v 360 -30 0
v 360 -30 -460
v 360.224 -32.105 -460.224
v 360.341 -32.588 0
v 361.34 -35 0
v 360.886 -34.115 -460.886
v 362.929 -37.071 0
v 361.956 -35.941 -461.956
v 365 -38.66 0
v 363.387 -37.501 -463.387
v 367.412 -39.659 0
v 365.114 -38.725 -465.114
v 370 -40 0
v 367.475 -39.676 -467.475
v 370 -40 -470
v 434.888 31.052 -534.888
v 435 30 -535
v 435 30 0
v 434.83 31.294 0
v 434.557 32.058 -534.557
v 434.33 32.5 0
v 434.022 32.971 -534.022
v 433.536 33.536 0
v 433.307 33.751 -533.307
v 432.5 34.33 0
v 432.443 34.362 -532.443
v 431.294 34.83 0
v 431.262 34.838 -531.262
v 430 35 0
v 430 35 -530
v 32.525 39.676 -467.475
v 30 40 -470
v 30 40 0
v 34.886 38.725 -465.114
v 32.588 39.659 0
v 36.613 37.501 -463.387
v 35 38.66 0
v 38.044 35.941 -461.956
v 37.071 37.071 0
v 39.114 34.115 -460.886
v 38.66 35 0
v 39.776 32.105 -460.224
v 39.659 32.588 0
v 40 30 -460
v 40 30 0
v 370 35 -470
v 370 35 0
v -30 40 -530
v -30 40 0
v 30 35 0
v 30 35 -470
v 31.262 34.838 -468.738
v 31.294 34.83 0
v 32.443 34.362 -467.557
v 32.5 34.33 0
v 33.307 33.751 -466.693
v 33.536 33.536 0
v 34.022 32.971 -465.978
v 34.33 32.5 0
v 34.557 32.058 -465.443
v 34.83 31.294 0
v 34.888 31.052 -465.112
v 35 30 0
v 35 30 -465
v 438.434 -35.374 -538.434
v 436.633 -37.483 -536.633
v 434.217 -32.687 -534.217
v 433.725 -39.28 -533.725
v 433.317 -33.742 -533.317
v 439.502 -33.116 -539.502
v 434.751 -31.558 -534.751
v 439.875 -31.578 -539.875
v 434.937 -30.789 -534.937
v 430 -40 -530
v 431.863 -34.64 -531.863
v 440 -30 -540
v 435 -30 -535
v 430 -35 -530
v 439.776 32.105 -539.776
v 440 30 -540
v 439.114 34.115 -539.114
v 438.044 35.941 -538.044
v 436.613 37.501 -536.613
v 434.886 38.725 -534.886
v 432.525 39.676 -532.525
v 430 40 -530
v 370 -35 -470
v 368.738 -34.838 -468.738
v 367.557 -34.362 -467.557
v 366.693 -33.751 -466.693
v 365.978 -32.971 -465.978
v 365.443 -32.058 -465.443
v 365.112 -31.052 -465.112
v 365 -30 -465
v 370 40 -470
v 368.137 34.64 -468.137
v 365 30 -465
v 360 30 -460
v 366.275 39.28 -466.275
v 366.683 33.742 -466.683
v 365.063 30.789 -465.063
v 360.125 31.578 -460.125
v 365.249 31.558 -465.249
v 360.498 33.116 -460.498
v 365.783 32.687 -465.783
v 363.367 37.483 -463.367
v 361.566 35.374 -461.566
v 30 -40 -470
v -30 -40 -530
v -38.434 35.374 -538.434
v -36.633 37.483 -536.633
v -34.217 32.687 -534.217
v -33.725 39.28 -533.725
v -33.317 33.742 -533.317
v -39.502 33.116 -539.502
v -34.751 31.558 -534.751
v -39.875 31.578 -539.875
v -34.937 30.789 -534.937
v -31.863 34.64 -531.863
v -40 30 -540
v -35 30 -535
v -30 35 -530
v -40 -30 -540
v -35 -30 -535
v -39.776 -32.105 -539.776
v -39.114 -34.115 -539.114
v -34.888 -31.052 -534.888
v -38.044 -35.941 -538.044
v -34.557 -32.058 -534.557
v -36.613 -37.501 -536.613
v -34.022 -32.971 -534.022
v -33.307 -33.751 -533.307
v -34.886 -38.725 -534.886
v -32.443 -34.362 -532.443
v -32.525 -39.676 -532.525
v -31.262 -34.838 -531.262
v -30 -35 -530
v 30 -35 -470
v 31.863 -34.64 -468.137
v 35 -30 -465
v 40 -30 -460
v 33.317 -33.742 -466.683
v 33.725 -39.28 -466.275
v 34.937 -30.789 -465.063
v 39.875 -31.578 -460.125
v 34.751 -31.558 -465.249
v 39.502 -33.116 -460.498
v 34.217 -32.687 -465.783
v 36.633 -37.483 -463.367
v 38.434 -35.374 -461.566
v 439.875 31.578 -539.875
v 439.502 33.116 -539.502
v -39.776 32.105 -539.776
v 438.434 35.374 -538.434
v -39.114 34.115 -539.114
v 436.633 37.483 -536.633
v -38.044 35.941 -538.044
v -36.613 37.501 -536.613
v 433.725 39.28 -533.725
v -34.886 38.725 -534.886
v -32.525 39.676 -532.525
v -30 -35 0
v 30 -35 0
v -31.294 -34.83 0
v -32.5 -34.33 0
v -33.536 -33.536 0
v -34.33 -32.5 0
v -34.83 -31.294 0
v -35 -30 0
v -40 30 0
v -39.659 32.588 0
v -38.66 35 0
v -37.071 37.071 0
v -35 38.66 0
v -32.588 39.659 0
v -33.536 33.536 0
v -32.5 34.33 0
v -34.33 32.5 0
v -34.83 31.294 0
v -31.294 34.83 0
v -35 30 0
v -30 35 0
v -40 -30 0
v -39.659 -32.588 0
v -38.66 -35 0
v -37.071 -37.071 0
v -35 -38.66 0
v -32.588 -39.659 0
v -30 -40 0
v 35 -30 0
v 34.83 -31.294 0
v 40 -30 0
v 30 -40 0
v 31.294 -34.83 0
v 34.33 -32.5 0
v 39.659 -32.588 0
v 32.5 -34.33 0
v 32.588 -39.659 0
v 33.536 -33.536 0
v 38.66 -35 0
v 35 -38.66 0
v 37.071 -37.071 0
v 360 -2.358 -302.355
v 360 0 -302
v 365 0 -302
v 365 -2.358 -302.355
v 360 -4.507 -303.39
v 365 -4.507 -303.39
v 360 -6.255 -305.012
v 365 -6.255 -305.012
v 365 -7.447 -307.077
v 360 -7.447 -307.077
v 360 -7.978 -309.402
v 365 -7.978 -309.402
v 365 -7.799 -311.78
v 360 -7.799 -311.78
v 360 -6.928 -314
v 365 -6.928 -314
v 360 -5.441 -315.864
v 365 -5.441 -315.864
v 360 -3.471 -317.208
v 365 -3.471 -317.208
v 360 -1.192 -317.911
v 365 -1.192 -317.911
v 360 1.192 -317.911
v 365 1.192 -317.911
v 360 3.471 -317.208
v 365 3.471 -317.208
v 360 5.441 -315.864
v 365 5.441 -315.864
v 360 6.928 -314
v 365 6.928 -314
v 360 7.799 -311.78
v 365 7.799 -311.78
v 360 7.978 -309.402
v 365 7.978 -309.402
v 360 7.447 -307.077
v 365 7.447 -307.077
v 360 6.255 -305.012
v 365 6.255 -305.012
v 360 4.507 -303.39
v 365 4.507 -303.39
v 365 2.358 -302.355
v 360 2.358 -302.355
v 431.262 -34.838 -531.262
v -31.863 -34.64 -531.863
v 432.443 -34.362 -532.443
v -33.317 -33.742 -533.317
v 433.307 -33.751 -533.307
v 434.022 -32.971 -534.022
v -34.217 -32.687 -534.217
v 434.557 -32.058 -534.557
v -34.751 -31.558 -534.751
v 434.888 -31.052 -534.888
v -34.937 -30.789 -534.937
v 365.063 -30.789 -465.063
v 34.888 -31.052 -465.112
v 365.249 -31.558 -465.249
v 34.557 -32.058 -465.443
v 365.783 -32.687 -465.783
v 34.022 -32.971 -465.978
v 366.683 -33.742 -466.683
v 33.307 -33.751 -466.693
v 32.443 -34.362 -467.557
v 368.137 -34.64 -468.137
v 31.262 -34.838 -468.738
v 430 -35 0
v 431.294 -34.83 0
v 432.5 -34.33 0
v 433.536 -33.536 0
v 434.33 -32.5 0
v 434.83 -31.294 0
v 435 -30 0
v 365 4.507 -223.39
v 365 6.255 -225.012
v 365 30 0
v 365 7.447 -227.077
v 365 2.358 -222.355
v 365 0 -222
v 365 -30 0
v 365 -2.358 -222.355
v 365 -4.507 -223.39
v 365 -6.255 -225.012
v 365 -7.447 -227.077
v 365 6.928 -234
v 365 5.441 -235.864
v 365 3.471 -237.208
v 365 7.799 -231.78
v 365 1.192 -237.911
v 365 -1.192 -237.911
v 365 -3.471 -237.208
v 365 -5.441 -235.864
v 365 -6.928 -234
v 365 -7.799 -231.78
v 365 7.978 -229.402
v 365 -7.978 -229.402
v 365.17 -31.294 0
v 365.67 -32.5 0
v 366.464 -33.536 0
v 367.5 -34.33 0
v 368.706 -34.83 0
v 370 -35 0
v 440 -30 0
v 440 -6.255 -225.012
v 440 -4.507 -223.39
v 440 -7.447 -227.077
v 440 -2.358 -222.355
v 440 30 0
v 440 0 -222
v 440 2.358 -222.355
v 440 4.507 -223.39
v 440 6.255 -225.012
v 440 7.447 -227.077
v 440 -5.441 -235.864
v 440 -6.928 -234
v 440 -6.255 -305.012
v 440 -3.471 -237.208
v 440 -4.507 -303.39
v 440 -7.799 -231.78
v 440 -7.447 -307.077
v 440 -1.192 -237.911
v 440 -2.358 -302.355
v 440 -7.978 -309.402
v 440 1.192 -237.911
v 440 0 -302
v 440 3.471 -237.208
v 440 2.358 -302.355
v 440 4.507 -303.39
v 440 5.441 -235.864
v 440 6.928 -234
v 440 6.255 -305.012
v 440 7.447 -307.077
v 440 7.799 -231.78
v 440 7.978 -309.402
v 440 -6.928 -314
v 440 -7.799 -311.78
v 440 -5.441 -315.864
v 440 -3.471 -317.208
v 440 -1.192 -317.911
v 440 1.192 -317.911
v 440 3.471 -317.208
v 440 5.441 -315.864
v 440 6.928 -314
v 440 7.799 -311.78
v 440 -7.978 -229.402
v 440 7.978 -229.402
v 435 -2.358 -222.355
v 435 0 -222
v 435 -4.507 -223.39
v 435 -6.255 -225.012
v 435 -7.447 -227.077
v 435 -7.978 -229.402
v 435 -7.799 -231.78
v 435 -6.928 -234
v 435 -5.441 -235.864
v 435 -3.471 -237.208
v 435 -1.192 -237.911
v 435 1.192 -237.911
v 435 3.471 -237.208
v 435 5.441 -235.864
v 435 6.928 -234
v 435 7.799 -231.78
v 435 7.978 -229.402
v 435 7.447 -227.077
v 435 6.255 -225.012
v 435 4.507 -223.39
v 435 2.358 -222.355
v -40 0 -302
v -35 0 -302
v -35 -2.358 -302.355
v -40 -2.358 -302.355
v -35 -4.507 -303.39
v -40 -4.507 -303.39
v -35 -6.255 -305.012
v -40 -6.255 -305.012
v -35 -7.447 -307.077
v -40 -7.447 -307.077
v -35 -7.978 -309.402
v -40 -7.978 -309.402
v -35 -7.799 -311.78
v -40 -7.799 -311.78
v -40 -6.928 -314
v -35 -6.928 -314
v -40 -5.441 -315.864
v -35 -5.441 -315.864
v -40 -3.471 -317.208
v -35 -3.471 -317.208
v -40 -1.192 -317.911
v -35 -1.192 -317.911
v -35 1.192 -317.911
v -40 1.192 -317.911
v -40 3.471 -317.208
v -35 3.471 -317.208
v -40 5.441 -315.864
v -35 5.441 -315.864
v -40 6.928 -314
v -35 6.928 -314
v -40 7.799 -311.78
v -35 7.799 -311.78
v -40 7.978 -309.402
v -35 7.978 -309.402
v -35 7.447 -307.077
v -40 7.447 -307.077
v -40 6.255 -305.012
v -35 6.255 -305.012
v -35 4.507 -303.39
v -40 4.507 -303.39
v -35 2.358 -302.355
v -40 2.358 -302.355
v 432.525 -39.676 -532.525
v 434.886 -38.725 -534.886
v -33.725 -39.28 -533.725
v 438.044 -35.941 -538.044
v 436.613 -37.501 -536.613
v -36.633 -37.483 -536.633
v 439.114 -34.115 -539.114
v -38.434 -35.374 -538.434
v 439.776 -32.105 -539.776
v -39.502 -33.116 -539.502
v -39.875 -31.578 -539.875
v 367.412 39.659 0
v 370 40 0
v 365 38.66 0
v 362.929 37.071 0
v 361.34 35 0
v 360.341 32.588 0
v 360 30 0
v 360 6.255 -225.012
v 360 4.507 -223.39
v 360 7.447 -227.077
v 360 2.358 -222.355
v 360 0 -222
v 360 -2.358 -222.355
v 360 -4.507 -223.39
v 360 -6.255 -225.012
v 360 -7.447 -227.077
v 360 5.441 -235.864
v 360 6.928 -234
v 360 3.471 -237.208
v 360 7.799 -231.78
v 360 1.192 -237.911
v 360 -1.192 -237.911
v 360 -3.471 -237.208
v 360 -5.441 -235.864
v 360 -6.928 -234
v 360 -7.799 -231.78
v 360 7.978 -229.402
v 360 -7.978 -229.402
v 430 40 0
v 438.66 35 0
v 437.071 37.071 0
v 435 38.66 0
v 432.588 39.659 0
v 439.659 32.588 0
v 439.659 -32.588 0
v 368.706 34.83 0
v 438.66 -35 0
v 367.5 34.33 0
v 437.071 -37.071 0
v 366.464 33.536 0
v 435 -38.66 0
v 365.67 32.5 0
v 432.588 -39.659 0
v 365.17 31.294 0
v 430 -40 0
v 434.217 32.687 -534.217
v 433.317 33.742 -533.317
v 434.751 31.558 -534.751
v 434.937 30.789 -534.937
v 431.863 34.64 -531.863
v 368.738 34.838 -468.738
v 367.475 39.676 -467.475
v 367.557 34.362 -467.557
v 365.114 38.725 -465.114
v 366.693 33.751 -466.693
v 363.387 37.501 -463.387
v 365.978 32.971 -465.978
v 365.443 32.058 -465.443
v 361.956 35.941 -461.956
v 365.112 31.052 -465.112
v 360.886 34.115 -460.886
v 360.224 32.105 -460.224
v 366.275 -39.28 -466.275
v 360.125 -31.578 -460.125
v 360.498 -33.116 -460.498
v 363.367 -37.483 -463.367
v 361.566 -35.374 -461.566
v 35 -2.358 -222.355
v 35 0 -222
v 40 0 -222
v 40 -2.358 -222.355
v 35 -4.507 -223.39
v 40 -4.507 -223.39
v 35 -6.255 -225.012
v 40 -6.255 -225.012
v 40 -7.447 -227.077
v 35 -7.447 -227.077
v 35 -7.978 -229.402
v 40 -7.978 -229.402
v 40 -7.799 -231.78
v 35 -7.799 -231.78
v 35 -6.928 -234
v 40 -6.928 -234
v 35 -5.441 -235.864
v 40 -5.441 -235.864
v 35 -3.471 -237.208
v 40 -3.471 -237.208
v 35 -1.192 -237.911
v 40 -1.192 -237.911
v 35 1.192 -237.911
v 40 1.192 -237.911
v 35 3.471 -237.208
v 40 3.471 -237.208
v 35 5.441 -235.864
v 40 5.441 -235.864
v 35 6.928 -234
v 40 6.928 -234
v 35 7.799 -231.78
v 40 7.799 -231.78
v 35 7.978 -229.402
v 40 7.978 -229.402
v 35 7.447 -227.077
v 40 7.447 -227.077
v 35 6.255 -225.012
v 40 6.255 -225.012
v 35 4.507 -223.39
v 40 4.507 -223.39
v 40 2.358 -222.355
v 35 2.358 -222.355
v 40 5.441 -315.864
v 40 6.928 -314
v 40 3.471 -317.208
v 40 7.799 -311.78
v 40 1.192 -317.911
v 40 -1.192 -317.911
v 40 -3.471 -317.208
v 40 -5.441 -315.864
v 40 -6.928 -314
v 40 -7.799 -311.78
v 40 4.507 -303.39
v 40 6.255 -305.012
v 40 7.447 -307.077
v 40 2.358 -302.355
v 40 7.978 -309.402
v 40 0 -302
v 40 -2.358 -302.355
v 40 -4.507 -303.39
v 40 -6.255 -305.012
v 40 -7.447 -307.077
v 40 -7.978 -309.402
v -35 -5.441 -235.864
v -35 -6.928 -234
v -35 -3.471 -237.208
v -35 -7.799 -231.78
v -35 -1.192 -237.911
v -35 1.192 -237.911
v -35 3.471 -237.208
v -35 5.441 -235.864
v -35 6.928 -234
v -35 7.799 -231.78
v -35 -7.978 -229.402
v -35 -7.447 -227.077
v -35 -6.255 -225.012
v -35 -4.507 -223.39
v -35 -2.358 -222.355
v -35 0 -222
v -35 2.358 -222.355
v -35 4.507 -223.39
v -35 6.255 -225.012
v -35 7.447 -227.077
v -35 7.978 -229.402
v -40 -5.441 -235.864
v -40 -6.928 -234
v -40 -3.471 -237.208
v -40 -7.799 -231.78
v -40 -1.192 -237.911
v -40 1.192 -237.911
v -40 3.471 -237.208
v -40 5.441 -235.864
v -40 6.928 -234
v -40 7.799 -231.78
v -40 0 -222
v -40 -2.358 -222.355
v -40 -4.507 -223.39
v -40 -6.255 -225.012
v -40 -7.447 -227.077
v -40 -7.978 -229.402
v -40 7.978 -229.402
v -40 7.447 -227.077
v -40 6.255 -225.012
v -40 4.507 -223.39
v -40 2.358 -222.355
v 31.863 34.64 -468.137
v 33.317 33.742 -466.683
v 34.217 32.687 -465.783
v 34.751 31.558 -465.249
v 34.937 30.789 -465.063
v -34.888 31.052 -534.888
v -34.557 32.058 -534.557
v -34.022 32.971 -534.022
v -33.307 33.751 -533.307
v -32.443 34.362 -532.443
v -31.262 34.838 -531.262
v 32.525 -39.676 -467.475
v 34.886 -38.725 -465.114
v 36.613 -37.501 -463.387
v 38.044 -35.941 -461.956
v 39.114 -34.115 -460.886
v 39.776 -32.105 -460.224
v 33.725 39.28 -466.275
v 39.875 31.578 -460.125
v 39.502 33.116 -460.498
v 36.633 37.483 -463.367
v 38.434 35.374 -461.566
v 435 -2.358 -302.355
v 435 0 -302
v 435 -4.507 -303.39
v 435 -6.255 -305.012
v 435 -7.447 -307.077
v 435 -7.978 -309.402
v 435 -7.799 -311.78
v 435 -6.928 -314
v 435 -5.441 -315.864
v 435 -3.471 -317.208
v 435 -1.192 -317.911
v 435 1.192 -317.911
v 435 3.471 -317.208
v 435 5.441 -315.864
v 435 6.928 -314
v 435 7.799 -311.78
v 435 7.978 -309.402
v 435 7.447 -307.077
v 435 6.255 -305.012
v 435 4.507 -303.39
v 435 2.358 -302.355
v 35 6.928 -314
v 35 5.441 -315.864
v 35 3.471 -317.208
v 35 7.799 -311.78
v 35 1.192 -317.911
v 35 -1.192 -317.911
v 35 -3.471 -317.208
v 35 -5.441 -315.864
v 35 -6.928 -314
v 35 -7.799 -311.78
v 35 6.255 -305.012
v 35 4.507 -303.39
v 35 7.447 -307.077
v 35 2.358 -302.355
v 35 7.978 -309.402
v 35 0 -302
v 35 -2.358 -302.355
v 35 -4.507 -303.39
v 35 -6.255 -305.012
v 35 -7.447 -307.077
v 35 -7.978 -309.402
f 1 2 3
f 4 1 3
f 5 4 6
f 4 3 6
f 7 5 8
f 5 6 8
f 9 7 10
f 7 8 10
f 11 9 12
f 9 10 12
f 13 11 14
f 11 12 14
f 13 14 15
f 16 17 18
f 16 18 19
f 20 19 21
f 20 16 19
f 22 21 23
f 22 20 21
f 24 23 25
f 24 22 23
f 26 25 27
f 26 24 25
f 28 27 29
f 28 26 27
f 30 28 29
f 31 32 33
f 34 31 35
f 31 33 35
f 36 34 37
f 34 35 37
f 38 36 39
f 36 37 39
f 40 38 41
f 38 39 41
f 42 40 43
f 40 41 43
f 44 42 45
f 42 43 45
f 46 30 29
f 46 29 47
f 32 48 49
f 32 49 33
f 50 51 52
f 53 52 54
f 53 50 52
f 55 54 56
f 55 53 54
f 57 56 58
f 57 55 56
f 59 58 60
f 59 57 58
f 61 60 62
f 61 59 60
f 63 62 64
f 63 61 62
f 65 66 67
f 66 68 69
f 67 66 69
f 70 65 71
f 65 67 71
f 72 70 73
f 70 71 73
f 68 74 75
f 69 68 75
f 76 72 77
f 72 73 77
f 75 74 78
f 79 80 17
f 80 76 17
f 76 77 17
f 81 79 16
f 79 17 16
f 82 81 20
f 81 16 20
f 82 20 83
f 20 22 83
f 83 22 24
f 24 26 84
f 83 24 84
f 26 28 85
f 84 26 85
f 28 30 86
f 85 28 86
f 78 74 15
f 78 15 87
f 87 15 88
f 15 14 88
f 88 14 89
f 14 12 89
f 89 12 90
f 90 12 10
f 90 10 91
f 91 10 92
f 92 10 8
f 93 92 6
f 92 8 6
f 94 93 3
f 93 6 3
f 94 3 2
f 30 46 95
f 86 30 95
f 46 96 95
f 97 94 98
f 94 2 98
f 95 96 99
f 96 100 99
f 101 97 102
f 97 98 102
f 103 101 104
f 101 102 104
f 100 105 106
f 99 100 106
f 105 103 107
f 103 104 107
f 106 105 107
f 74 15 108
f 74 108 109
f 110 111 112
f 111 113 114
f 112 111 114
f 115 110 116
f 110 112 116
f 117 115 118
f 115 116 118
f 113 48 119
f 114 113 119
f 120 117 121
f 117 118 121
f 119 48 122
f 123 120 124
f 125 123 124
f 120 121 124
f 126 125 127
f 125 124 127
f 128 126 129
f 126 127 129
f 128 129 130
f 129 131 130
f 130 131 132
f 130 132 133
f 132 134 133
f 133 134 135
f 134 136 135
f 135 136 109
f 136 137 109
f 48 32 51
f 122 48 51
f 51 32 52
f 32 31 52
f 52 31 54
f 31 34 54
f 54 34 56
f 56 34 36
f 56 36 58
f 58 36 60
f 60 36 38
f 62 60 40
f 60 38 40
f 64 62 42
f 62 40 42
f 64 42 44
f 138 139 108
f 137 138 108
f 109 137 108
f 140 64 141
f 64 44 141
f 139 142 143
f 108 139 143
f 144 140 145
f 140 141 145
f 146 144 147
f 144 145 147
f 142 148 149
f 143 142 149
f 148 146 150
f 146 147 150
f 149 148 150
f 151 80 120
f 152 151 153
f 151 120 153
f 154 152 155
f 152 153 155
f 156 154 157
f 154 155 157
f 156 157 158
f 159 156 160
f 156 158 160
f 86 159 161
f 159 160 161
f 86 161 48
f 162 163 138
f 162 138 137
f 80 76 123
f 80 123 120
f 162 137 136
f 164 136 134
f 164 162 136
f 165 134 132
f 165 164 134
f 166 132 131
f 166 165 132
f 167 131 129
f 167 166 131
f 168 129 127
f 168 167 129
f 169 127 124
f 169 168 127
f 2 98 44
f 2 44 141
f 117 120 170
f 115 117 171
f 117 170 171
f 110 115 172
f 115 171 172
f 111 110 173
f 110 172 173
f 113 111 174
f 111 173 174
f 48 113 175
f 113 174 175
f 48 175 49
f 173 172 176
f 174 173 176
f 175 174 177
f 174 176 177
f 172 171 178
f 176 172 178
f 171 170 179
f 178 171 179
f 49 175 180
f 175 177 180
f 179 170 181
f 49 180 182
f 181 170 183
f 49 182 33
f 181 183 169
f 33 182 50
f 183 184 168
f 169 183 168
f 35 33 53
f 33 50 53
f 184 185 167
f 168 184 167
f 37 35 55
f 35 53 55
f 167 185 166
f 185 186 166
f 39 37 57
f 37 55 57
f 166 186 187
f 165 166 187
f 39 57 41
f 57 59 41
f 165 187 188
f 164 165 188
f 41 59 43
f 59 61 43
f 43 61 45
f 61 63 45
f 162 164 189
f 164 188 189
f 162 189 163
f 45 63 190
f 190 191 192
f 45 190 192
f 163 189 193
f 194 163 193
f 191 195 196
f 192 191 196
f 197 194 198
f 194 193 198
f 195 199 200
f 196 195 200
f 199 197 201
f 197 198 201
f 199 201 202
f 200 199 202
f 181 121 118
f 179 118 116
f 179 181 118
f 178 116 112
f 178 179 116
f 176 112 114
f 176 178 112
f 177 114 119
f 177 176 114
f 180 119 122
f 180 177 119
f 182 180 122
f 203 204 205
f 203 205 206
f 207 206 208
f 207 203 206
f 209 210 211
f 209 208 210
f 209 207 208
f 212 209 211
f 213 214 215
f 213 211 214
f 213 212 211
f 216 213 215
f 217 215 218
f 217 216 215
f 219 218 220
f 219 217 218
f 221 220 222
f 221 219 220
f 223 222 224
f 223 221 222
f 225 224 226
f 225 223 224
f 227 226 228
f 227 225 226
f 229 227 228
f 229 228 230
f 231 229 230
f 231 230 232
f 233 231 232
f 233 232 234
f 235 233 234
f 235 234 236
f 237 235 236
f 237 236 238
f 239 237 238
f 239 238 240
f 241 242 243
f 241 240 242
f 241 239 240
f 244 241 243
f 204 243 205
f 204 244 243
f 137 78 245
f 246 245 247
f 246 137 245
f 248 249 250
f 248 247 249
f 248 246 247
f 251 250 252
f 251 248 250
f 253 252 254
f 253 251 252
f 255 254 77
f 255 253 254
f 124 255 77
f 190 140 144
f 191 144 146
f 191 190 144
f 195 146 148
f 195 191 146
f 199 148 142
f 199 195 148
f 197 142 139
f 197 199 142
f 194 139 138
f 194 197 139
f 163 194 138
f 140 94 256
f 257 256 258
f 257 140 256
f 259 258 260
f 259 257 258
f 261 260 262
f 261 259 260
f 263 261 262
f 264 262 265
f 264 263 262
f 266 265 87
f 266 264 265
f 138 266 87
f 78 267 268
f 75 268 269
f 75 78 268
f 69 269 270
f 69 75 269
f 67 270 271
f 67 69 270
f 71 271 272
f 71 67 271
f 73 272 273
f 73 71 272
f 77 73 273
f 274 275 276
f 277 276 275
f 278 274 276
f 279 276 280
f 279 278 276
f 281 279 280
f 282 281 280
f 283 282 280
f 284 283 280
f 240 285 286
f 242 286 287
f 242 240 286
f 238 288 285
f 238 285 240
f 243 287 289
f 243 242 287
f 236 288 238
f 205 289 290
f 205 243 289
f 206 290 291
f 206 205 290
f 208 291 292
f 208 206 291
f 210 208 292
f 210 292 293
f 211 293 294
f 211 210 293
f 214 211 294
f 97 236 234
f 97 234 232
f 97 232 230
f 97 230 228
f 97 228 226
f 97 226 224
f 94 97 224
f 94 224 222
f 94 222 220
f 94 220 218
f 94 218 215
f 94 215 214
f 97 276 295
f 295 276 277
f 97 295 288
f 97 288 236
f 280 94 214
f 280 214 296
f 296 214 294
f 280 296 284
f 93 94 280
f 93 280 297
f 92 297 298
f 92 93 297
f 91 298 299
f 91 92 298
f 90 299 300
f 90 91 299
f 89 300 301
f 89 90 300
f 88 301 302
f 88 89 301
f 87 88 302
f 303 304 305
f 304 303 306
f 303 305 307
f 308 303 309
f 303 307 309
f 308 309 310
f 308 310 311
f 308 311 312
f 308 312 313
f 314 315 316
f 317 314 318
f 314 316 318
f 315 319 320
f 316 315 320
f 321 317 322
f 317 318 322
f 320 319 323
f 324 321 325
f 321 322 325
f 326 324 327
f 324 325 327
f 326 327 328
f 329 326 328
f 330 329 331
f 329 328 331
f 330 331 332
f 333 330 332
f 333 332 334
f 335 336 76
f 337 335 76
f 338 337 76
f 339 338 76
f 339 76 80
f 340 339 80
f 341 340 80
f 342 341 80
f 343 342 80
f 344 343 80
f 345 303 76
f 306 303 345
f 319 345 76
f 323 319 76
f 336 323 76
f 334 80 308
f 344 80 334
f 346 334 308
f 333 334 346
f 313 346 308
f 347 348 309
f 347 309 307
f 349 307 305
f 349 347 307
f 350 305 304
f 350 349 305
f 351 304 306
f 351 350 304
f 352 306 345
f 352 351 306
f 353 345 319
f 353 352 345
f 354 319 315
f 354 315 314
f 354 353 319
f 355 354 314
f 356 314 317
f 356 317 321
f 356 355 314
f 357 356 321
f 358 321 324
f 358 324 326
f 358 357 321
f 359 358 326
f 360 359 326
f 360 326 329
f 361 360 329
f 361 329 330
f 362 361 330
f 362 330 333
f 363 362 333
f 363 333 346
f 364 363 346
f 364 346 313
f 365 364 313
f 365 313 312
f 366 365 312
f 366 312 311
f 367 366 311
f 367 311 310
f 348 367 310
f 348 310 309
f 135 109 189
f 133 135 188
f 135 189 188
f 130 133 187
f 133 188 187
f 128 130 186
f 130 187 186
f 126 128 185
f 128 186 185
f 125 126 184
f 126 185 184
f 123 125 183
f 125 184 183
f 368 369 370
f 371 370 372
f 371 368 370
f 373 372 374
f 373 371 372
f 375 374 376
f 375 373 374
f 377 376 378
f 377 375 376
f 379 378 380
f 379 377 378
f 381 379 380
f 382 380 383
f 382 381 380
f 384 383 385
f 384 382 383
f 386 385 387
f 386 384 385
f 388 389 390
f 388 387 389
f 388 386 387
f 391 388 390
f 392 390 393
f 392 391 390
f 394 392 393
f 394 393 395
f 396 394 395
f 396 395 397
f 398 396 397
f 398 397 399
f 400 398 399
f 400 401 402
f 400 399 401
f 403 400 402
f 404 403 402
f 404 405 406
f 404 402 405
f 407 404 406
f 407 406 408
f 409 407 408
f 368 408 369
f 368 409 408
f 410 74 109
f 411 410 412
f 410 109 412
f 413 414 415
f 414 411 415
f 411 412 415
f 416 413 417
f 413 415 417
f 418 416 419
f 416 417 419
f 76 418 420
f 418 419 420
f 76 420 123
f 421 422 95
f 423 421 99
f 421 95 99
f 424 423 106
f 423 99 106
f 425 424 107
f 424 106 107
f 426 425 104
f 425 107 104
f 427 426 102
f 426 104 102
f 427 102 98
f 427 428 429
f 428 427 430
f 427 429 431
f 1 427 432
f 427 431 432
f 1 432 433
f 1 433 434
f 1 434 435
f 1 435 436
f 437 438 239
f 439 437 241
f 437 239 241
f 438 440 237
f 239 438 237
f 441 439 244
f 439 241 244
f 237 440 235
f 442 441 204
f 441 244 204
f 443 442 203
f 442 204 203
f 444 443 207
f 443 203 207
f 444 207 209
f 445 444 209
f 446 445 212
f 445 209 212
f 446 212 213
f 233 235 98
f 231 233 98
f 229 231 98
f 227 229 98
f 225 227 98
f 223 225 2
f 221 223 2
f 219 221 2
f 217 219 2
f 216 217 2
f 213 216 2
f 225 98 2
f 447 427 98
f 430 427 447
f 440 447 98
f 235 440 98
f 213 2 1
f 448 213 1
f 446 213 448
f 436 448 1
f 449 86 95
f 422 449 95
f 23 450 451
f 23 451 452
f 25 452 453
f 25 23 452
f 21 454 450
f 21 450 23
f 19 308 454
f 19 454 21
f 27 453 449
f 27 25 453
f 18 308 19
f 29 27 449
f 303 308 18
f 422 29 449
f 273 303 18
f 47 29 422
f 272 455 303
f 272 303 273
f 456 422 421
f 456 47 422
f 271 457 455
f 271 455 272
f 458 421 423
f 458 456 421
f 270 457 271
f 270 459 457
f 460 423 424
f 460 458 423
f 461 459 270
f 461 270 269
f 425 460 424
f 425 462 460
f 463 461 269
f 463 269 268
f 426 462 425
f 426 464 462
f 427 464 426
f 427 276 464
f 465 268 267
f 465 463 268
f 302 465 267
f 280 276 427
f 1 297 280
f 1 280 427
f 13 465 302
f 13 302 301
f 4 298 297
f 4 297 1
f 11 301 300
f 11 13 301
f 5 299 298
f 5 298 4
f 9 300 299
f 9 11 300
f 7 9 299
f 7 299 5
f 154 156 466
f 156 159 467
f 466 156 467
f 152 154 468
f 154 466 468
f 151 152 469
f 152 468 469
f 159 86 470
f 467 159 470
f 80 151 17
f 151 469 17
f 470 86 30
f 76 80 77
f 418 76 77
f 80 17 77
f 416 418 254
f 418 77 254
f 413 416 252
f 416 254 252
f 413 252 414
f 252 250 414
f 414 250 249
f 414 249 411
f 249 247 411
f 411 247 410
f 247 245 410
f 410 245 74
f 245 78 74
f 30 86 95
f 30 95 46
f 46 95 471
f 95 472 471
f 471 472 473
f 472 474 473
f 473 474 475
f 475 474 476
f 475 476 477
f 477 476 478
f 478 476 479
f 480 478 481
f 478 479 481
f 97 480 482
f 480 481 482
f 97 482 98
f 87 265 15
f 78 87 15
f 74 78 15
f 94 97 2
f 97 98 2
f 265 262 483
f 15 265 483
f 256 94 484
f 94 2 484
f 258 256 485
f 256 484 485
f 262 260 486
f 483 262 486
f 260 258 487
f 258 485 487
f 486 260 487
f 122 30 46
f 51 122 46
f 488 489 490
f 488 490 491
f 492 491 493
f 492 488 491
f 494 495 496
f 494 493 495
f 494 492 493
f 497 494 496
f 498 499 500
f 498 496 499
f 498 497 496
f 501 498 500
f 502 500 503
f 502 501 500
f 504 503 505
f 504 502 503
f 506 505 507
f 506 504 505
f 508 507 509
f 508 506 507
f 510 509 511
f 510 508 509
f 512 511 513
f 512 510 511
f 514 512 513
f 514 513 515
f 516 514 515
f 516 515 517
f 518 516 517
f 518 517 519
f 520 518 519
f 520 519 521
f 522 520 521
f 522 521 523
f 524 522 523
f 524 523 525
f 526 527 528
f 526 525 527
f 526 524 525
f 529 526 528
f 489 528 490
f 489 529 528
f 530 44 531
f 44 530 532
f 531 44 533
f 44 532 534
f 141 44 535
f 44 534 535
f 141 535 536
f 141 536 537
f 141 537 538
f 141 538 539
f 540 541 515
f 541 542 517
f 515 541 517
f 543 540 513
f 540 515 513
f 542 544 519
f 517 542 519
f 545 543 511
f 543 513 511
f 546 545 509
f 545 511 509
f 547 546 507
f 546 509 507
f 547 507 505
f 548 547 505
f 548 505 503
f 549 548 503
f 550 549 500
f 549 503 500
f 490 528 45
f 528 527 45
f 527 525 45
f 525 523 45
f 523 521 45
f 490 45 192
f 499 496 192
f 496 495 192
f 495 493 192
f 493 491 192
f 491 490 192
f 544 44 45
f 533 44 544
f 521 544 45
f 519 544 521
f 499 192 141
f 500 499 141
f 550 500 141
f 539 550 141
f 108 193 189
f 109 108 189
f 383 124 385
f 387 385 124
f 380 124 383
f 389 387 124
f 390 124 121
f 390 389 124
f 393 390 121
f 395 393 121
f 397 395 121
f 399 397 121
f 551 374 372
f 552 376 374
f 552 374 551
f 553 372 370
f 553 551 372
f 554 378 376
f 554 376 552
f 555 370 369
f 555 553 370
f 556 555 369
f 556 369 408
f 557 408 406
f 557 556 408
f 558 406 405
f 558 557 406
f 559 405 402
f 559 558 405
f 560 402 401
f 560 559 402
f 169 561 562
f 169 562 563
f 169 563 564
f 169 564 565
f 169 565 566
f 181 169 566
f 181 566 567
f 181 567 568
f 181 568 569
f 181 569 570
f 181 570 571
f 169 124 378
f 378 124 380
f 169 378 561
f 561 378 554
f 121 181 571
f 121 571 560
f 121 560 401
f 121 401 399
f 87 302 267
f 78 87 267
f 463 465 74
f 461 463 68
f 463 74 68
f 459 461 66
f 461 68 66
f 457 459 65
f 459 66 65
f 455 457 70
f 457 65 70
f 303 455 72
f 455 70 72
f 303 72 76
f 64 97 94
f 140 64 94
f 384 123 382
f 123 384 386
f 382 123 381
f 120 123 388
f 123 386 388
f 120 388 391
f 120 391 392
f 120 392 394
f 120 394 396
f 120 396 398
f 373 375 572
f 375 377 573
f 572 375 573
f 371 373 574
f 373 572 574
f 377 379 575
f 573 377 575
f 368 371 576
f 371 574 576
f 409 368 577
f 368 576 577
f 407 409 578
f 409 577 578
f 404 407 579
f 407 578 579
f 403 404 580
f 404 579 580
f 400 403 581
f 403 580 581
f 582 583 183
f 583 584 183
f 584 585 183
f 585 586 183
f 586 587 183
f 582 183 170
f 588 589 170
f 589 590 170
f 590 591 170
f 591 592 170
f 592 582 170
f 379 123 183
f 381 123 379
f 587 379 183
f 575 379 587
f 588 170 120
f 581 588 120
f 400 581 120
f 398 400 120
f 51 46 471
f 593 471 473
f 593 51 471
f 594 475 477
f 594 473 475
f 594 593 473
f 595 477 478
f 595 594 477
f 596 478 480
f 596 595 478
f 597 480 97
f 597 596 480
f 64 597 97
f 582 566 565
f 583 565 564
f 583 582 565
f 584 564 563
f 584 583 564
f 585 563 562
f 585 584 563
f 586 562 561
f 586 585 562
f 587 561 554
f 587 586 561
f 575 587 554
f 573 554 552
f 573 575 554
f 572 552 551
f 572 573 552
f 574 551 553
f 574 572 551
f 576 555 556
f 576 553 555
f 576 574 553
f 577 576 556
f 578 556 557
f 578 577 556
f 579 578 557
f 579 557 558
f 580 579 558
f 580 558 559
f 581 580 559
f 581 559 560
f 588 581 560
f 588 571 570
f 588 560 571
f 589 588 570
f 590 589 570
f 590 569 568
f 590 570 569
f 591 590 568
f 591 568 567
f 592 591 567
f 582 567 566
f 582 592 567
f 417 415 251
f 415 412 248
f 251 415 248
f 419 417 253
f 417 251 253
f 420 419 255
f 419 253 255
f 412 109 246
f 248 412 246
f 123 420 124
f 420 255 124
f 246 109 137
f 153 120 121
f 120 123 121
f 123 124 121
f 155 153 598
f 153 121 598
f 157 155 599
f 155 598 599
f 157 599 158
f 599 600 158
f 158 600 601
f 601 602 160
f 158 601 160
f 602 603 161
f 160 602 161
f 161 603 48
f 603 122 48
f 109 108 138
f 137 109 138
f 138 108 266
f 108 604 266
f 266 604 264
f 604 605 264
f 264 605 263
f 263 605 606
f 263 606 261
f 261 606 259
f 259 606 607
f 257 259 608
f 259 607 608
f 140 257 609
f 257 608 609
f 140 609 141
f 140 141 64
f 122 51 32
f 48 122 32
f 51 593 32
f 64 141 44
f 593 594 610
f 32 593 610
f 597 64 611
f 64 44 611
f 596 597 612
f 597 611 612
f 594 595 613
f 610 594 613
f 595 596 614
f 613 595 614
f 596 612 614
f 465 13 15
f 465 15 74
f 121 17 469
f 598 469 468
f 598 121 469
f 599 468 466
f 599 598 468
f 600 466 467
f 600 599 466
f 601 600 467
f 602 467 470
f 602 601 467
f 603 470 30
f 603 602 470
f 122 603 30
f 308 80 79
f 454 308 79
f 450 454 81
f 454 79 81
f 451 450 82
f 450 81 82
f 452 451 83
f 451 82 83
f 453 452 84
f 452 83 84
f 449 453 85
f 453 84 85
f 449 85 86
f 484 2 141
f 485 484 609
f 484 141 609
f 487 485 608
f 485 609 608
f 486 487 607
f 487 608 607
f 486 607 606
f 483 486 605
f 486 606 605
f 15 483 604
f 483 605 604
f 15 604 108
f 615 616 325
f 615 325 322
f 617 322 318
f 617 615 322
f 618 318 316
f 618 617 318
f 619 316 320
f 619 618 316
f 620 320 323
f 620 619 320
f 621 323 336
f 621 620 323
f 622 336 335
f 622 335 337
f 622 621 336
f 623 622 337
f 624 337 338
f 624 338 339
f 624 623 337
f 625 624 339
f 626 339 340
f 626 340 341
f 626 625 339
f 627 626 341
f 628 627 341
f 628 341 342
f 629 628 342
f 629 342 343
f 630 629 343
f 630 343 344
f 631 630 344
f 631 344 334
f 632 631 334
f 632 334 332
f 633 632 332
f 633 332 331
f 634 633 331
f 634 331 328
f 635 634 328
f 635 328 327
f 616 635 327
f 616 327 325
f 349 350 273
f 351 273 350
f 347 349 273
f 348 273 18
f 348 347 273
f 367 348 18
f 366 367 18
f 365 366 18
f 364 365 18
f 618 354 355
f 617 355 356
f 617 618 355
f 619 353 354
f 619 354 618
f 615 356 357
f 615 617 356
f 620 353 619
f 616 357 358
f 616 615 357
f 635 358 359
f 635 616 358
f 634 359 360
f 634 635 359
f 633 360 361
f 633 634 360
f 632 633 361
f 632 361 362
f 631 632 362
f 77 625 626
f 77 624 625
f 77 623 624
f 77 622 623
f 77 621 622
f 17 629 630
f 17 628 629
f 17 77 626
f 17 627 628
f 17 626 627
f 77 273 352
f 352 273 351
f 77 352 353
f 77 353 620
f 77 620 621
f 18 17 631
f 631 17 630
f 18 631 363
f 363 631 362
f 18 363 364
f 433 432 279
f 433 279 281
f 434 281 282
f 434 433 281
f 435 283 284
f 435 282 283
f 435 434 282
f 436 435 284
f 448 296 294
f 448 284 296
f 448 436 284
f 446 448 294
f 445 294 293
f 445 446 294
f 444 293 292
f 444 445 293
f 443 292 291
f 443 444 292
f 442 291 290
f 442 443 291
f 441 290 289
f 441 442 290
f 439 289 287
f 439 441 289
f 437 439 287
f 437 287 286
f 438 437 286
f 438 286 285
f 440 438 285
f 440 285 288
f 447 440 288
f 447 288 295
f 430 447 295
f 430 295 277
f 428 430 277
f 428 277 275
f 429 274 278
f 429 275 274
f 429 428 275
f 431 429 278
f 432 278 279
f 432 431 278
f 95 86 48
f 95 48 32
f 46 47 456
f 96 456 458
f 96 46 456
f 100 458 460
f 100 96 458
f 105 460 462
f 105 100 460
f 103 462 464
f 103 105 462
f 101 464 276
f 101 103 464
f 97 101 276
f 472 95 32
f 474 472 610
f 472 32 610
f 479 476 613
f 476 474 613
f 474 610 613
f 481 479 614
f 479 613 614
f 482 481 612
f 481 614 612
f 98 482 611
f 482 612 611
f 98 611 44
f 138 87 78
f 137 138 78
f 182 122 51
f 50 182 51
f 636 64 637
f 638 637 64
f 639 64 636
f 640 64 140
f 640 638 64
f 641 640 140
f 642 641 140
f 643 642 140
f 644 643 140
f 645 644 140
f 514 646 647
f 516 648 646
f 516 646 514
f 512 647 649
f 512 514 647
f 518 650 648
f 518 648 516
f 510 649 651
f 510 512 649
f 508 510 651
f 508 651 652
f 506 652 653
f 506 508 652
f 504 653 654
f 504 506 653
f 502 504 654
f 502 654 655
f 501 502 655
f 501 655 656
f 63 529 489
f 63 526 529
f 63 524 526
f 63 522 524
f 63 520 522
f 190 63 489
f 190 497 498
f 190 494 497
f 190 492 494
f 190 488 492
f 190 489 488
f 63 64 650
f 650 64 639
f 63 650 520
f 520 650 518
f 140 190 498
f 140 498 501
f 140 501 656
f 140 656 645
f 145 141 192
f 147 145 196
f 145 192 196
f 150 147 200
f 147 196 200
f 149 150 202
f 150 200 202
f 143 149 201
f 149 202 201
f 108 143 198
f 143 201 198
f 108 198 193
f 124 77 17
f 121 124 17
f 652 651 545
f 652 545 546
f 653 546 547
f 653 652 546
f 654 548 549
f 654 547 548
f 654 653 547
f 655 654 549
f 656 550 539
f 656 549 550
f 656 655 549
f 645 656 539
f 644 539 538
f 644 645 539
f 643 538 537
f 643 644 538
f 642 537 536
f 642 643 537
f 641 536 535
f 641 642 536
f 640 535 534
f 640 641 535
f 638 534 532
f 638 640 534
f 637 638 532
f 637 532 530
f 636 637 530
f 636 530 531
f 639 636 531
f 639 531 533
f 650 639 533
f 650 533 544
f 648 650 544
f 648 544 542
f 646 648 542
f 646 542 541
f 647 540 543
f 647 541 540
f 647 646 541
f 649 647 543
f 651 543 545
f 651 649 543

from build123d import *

# Parameters (mm, degrees)
SQUARE_TUBE_80_X_80_X_5_1_DEPTH   = 557.568542495
SQUARE_TUBE_80_X_80_X_5_1_2_DEPTH = 515.13708499
SQUARE_TUBE_80_X_80_X_5_1_3_DEPTH = 557.568542495
CUT_EXTRUDE1_START                = -480
SKETCH2_R                         = 8
CUT_EXTRUDE1_DEPTH                = 480


with BuildPart() as part:
    # Sketch1 → Square tube 80 X 80 X 5(1) (new body)
    with BuildSketch(Plane(origin=(0, 0, 0), x_dir=(1, 0, 0), z_dir=(0, 0, -1))):
        with BuildLine():
            Line((-30, -40), (30, -40))
            ThreePointArc((30, -40), (37.071067812, -37.071067812), (40, -30))
            Line((40, -30), (40, 30))
            ThreePointArc((40, 30), (37.071067812, 37.071067812), (30, 40))
            Line((30, 40), (-30, 40))
            ThreePointArc((-30, 40), (-37.071067812, 37.071067812), (-40, 30))
            Line((-40, 30), (-40, -30))
            ThreePointArc((-40, -30), (-37.071067812, -37.071067812), (-30, -40))
        make_face()
        with BuildLine():
            Line((-30, -35), (30, -35))
            ThreePointArc((30, -35), (33.535533906, -33.535533906), (35, -30))
            Line((35, -30), (35, 30))
            ThreePointArc((35, 30), (33.535533906, 33.535533906), (30, 35))
            Line((30, 35), (-30, 35))
            ThreePointArc((-30, 35), (-33.535533906, 33.535533906), (-35, 30))
            Line((-35, 30), (-35, -30))
            ThreePointArc((-35, -30), (-33.535533906, -33.535533906), (-30, -35))
        make_face(mode=Mode.SUBTRACT)
    extrude(amount=SQUARE_TUBE_80_X_80_X_5_1_DEPTH)

    # Square tube 80 X 80 X 5(1) mitre 1
    split(bisect_by=Plane(origin=(0, 0, -500), x_dir=(0, -1, 0), z_dir=(-0.707106781, 0, 0.707106781)), keep=Keep.TOP)


with BuildPart() as body_2:
    # Sketch1 on segment 2 (carried to segment 2) → Square tube 80 X 80 X 5_1 2 (new body)
    with BuildSketch(Plane(origin=(-57.568542495, 0, -500), x_dir=(0, 0, 1), z_dir=(1, 0, 0))):
        with BuildLine():
            Line((-30, -40), (30, -40))
            ThreePointArc((30, -40), (37.071067812, -37.071067812), (40, -30))
            Line((40, -30), (40, 30))
            ThreePointArc((40, 30), (37.071067812, 37.071067812), (30, 40))
            Line((30, 40), (-30, 40))
            ThreePointArc((-30, 40), (-37.071067812, 37.071067812), (-40, 30))
            Line((-40, 30), (-40, -30))
            ThreePointArc((-40, -30), (-37.071067812, -37.071067812), (-30, -40))
        make_face()
        with BuildLine():
            Line((-30, -35), (30, -35))
            ThreePointArc((30, -35), (33.535533906, -33.535533906), (35, -30))
            Line((35, -30), (35, 30))
            ThreePointArc((35, 30), (33.535533906, 33.535533906), (30, 35))
            Line((30, 35), (-30, 35))
            ThreePointArc((-30, 35), (-33.535533906, 33.535533906), (-35, 30))
            Line((-35, 30), (-35, -30))
            ThreePointArc((-35, -30), (-33.535533906, -33.535533906), (-30, -35))
        make_face(mode=Mode.SUBTRACT)
    extrude(amount=SQUARE_TUBE_80_X_80_X_5_1_2_DEPTH)

    # Square tube 80 X 80 X 5_1 2 mitre 1
    split(bisect_by=Plane(origin=(0, 0, -500), x_dir=(0, 1, 0), z_dir=(0.707106781, 0, -0.707106781)), keep=Keep.TOP)

    # Square tube 80 X 80 X 5_1 2 mitre 2
    split(bisect_by=Plane(origin=(400, 0, -500), x_dir=(0, -1, 0), z_dir=(-0.707106781, 0, -0.707106781)), keep=Keep.TOP)


with BuildPart() as body_3:
    # Sketch1 on segment 3 (carried to segment 3) → Square tube 80 X 80 X 5_1 3 (new body)
    with BuildSketch(Plane(origin=(400, 0, -557.568542495), x_dir=(-1, 0, 0), z_dir=(0, 0, 1))):
        with BuildLine():
            Line((-30, -40), (30, -40))
            ThreePointArc((30, -40), (37.071067812, -37.071067812), (40, -30))
            Line((40, -30), (40, 30))
            ThreePointArc((40, 30), (37.071067812, 37.071067812), (30, 40))
            Line((30, 40), (-30, 40))
            ThreePointArc((-30, 40), (-37.071067812, 37.071067812), (-40, 30))
            Line((-40, 30), (-40, -30))
            ThreePointArc((-40, -30), (-37.071067812, -37.071067812), (-30, -40))
        make_face()
        with BuildLine():
            Line((-30, -35), (30, -35))
            ThreePointArc((30, -35), (33.535533906, -33.535533906), (35, -30))
            Line((35, -30), (35, 30))
            ThreePointArc((35, 30), (33.535533906, 33.535533906), (30, 35))
            Line((30, 35), (-30, 35))
            ThreePointArc((-30, 35), (-33.535533906, 33.535533906), (-35, 30))
            Line((-35, 30), (-35, -30))
            ThreePointArc((-35, -30), (-33.535533906, -33.535533906), (-30, -35))
        make_face(mode=Mode.SUBTRACT)
    extrude(amount=SQUARE_TUBE_80_X_80_X_5_1_3_DEPTH)

    # Square tube 80 X 80 X 5_1 3 mitre 1
    split(bisect_by=Plane(origin=(400, 0, -500), x_dir=(0, 1, 0), z_dir=(0.707106781, 0, 0.707106781)), keep=Keep.TOP)


with BuildPart() as cut_extrude1_tool:
    # Sketch2 → Cut-Extrude1 (new body)
    with BuildSketch(Plane(origin=(440, 0, 0), x_dir=(0, 0, -1), z_dir=(1, 0, 0)).offset(CUT_EXTRUDE1_START)):
        with Locations(Location((230, 0, 0), (0, 0, 180))):
            Circle(SKETCH2_R)
        with Locations(Location((310, 0, 0), (0, 0, 180))):
            Circle(SKETCH2_R)
    extrude(amount=CUT_EXTRUDE1_DEPTH)


with BuildPart() as part_1:
    add(part.part)

    # Cut-Extrude1: cut by cut_extrude1_tool
    add(cut_extrude1_tool.part, mode=Mode.SUBTRACT)


with BuildPart() as body_3_1:
    add(body_3.part)

    # Cut-Extrude1: cut by cut_extrude1_tool
    add(cut_extrude1_tool.part, mode=Mode.SUBTRACT)


solid = Compound([body_2.part, part_1.part, body_3_1.part])
